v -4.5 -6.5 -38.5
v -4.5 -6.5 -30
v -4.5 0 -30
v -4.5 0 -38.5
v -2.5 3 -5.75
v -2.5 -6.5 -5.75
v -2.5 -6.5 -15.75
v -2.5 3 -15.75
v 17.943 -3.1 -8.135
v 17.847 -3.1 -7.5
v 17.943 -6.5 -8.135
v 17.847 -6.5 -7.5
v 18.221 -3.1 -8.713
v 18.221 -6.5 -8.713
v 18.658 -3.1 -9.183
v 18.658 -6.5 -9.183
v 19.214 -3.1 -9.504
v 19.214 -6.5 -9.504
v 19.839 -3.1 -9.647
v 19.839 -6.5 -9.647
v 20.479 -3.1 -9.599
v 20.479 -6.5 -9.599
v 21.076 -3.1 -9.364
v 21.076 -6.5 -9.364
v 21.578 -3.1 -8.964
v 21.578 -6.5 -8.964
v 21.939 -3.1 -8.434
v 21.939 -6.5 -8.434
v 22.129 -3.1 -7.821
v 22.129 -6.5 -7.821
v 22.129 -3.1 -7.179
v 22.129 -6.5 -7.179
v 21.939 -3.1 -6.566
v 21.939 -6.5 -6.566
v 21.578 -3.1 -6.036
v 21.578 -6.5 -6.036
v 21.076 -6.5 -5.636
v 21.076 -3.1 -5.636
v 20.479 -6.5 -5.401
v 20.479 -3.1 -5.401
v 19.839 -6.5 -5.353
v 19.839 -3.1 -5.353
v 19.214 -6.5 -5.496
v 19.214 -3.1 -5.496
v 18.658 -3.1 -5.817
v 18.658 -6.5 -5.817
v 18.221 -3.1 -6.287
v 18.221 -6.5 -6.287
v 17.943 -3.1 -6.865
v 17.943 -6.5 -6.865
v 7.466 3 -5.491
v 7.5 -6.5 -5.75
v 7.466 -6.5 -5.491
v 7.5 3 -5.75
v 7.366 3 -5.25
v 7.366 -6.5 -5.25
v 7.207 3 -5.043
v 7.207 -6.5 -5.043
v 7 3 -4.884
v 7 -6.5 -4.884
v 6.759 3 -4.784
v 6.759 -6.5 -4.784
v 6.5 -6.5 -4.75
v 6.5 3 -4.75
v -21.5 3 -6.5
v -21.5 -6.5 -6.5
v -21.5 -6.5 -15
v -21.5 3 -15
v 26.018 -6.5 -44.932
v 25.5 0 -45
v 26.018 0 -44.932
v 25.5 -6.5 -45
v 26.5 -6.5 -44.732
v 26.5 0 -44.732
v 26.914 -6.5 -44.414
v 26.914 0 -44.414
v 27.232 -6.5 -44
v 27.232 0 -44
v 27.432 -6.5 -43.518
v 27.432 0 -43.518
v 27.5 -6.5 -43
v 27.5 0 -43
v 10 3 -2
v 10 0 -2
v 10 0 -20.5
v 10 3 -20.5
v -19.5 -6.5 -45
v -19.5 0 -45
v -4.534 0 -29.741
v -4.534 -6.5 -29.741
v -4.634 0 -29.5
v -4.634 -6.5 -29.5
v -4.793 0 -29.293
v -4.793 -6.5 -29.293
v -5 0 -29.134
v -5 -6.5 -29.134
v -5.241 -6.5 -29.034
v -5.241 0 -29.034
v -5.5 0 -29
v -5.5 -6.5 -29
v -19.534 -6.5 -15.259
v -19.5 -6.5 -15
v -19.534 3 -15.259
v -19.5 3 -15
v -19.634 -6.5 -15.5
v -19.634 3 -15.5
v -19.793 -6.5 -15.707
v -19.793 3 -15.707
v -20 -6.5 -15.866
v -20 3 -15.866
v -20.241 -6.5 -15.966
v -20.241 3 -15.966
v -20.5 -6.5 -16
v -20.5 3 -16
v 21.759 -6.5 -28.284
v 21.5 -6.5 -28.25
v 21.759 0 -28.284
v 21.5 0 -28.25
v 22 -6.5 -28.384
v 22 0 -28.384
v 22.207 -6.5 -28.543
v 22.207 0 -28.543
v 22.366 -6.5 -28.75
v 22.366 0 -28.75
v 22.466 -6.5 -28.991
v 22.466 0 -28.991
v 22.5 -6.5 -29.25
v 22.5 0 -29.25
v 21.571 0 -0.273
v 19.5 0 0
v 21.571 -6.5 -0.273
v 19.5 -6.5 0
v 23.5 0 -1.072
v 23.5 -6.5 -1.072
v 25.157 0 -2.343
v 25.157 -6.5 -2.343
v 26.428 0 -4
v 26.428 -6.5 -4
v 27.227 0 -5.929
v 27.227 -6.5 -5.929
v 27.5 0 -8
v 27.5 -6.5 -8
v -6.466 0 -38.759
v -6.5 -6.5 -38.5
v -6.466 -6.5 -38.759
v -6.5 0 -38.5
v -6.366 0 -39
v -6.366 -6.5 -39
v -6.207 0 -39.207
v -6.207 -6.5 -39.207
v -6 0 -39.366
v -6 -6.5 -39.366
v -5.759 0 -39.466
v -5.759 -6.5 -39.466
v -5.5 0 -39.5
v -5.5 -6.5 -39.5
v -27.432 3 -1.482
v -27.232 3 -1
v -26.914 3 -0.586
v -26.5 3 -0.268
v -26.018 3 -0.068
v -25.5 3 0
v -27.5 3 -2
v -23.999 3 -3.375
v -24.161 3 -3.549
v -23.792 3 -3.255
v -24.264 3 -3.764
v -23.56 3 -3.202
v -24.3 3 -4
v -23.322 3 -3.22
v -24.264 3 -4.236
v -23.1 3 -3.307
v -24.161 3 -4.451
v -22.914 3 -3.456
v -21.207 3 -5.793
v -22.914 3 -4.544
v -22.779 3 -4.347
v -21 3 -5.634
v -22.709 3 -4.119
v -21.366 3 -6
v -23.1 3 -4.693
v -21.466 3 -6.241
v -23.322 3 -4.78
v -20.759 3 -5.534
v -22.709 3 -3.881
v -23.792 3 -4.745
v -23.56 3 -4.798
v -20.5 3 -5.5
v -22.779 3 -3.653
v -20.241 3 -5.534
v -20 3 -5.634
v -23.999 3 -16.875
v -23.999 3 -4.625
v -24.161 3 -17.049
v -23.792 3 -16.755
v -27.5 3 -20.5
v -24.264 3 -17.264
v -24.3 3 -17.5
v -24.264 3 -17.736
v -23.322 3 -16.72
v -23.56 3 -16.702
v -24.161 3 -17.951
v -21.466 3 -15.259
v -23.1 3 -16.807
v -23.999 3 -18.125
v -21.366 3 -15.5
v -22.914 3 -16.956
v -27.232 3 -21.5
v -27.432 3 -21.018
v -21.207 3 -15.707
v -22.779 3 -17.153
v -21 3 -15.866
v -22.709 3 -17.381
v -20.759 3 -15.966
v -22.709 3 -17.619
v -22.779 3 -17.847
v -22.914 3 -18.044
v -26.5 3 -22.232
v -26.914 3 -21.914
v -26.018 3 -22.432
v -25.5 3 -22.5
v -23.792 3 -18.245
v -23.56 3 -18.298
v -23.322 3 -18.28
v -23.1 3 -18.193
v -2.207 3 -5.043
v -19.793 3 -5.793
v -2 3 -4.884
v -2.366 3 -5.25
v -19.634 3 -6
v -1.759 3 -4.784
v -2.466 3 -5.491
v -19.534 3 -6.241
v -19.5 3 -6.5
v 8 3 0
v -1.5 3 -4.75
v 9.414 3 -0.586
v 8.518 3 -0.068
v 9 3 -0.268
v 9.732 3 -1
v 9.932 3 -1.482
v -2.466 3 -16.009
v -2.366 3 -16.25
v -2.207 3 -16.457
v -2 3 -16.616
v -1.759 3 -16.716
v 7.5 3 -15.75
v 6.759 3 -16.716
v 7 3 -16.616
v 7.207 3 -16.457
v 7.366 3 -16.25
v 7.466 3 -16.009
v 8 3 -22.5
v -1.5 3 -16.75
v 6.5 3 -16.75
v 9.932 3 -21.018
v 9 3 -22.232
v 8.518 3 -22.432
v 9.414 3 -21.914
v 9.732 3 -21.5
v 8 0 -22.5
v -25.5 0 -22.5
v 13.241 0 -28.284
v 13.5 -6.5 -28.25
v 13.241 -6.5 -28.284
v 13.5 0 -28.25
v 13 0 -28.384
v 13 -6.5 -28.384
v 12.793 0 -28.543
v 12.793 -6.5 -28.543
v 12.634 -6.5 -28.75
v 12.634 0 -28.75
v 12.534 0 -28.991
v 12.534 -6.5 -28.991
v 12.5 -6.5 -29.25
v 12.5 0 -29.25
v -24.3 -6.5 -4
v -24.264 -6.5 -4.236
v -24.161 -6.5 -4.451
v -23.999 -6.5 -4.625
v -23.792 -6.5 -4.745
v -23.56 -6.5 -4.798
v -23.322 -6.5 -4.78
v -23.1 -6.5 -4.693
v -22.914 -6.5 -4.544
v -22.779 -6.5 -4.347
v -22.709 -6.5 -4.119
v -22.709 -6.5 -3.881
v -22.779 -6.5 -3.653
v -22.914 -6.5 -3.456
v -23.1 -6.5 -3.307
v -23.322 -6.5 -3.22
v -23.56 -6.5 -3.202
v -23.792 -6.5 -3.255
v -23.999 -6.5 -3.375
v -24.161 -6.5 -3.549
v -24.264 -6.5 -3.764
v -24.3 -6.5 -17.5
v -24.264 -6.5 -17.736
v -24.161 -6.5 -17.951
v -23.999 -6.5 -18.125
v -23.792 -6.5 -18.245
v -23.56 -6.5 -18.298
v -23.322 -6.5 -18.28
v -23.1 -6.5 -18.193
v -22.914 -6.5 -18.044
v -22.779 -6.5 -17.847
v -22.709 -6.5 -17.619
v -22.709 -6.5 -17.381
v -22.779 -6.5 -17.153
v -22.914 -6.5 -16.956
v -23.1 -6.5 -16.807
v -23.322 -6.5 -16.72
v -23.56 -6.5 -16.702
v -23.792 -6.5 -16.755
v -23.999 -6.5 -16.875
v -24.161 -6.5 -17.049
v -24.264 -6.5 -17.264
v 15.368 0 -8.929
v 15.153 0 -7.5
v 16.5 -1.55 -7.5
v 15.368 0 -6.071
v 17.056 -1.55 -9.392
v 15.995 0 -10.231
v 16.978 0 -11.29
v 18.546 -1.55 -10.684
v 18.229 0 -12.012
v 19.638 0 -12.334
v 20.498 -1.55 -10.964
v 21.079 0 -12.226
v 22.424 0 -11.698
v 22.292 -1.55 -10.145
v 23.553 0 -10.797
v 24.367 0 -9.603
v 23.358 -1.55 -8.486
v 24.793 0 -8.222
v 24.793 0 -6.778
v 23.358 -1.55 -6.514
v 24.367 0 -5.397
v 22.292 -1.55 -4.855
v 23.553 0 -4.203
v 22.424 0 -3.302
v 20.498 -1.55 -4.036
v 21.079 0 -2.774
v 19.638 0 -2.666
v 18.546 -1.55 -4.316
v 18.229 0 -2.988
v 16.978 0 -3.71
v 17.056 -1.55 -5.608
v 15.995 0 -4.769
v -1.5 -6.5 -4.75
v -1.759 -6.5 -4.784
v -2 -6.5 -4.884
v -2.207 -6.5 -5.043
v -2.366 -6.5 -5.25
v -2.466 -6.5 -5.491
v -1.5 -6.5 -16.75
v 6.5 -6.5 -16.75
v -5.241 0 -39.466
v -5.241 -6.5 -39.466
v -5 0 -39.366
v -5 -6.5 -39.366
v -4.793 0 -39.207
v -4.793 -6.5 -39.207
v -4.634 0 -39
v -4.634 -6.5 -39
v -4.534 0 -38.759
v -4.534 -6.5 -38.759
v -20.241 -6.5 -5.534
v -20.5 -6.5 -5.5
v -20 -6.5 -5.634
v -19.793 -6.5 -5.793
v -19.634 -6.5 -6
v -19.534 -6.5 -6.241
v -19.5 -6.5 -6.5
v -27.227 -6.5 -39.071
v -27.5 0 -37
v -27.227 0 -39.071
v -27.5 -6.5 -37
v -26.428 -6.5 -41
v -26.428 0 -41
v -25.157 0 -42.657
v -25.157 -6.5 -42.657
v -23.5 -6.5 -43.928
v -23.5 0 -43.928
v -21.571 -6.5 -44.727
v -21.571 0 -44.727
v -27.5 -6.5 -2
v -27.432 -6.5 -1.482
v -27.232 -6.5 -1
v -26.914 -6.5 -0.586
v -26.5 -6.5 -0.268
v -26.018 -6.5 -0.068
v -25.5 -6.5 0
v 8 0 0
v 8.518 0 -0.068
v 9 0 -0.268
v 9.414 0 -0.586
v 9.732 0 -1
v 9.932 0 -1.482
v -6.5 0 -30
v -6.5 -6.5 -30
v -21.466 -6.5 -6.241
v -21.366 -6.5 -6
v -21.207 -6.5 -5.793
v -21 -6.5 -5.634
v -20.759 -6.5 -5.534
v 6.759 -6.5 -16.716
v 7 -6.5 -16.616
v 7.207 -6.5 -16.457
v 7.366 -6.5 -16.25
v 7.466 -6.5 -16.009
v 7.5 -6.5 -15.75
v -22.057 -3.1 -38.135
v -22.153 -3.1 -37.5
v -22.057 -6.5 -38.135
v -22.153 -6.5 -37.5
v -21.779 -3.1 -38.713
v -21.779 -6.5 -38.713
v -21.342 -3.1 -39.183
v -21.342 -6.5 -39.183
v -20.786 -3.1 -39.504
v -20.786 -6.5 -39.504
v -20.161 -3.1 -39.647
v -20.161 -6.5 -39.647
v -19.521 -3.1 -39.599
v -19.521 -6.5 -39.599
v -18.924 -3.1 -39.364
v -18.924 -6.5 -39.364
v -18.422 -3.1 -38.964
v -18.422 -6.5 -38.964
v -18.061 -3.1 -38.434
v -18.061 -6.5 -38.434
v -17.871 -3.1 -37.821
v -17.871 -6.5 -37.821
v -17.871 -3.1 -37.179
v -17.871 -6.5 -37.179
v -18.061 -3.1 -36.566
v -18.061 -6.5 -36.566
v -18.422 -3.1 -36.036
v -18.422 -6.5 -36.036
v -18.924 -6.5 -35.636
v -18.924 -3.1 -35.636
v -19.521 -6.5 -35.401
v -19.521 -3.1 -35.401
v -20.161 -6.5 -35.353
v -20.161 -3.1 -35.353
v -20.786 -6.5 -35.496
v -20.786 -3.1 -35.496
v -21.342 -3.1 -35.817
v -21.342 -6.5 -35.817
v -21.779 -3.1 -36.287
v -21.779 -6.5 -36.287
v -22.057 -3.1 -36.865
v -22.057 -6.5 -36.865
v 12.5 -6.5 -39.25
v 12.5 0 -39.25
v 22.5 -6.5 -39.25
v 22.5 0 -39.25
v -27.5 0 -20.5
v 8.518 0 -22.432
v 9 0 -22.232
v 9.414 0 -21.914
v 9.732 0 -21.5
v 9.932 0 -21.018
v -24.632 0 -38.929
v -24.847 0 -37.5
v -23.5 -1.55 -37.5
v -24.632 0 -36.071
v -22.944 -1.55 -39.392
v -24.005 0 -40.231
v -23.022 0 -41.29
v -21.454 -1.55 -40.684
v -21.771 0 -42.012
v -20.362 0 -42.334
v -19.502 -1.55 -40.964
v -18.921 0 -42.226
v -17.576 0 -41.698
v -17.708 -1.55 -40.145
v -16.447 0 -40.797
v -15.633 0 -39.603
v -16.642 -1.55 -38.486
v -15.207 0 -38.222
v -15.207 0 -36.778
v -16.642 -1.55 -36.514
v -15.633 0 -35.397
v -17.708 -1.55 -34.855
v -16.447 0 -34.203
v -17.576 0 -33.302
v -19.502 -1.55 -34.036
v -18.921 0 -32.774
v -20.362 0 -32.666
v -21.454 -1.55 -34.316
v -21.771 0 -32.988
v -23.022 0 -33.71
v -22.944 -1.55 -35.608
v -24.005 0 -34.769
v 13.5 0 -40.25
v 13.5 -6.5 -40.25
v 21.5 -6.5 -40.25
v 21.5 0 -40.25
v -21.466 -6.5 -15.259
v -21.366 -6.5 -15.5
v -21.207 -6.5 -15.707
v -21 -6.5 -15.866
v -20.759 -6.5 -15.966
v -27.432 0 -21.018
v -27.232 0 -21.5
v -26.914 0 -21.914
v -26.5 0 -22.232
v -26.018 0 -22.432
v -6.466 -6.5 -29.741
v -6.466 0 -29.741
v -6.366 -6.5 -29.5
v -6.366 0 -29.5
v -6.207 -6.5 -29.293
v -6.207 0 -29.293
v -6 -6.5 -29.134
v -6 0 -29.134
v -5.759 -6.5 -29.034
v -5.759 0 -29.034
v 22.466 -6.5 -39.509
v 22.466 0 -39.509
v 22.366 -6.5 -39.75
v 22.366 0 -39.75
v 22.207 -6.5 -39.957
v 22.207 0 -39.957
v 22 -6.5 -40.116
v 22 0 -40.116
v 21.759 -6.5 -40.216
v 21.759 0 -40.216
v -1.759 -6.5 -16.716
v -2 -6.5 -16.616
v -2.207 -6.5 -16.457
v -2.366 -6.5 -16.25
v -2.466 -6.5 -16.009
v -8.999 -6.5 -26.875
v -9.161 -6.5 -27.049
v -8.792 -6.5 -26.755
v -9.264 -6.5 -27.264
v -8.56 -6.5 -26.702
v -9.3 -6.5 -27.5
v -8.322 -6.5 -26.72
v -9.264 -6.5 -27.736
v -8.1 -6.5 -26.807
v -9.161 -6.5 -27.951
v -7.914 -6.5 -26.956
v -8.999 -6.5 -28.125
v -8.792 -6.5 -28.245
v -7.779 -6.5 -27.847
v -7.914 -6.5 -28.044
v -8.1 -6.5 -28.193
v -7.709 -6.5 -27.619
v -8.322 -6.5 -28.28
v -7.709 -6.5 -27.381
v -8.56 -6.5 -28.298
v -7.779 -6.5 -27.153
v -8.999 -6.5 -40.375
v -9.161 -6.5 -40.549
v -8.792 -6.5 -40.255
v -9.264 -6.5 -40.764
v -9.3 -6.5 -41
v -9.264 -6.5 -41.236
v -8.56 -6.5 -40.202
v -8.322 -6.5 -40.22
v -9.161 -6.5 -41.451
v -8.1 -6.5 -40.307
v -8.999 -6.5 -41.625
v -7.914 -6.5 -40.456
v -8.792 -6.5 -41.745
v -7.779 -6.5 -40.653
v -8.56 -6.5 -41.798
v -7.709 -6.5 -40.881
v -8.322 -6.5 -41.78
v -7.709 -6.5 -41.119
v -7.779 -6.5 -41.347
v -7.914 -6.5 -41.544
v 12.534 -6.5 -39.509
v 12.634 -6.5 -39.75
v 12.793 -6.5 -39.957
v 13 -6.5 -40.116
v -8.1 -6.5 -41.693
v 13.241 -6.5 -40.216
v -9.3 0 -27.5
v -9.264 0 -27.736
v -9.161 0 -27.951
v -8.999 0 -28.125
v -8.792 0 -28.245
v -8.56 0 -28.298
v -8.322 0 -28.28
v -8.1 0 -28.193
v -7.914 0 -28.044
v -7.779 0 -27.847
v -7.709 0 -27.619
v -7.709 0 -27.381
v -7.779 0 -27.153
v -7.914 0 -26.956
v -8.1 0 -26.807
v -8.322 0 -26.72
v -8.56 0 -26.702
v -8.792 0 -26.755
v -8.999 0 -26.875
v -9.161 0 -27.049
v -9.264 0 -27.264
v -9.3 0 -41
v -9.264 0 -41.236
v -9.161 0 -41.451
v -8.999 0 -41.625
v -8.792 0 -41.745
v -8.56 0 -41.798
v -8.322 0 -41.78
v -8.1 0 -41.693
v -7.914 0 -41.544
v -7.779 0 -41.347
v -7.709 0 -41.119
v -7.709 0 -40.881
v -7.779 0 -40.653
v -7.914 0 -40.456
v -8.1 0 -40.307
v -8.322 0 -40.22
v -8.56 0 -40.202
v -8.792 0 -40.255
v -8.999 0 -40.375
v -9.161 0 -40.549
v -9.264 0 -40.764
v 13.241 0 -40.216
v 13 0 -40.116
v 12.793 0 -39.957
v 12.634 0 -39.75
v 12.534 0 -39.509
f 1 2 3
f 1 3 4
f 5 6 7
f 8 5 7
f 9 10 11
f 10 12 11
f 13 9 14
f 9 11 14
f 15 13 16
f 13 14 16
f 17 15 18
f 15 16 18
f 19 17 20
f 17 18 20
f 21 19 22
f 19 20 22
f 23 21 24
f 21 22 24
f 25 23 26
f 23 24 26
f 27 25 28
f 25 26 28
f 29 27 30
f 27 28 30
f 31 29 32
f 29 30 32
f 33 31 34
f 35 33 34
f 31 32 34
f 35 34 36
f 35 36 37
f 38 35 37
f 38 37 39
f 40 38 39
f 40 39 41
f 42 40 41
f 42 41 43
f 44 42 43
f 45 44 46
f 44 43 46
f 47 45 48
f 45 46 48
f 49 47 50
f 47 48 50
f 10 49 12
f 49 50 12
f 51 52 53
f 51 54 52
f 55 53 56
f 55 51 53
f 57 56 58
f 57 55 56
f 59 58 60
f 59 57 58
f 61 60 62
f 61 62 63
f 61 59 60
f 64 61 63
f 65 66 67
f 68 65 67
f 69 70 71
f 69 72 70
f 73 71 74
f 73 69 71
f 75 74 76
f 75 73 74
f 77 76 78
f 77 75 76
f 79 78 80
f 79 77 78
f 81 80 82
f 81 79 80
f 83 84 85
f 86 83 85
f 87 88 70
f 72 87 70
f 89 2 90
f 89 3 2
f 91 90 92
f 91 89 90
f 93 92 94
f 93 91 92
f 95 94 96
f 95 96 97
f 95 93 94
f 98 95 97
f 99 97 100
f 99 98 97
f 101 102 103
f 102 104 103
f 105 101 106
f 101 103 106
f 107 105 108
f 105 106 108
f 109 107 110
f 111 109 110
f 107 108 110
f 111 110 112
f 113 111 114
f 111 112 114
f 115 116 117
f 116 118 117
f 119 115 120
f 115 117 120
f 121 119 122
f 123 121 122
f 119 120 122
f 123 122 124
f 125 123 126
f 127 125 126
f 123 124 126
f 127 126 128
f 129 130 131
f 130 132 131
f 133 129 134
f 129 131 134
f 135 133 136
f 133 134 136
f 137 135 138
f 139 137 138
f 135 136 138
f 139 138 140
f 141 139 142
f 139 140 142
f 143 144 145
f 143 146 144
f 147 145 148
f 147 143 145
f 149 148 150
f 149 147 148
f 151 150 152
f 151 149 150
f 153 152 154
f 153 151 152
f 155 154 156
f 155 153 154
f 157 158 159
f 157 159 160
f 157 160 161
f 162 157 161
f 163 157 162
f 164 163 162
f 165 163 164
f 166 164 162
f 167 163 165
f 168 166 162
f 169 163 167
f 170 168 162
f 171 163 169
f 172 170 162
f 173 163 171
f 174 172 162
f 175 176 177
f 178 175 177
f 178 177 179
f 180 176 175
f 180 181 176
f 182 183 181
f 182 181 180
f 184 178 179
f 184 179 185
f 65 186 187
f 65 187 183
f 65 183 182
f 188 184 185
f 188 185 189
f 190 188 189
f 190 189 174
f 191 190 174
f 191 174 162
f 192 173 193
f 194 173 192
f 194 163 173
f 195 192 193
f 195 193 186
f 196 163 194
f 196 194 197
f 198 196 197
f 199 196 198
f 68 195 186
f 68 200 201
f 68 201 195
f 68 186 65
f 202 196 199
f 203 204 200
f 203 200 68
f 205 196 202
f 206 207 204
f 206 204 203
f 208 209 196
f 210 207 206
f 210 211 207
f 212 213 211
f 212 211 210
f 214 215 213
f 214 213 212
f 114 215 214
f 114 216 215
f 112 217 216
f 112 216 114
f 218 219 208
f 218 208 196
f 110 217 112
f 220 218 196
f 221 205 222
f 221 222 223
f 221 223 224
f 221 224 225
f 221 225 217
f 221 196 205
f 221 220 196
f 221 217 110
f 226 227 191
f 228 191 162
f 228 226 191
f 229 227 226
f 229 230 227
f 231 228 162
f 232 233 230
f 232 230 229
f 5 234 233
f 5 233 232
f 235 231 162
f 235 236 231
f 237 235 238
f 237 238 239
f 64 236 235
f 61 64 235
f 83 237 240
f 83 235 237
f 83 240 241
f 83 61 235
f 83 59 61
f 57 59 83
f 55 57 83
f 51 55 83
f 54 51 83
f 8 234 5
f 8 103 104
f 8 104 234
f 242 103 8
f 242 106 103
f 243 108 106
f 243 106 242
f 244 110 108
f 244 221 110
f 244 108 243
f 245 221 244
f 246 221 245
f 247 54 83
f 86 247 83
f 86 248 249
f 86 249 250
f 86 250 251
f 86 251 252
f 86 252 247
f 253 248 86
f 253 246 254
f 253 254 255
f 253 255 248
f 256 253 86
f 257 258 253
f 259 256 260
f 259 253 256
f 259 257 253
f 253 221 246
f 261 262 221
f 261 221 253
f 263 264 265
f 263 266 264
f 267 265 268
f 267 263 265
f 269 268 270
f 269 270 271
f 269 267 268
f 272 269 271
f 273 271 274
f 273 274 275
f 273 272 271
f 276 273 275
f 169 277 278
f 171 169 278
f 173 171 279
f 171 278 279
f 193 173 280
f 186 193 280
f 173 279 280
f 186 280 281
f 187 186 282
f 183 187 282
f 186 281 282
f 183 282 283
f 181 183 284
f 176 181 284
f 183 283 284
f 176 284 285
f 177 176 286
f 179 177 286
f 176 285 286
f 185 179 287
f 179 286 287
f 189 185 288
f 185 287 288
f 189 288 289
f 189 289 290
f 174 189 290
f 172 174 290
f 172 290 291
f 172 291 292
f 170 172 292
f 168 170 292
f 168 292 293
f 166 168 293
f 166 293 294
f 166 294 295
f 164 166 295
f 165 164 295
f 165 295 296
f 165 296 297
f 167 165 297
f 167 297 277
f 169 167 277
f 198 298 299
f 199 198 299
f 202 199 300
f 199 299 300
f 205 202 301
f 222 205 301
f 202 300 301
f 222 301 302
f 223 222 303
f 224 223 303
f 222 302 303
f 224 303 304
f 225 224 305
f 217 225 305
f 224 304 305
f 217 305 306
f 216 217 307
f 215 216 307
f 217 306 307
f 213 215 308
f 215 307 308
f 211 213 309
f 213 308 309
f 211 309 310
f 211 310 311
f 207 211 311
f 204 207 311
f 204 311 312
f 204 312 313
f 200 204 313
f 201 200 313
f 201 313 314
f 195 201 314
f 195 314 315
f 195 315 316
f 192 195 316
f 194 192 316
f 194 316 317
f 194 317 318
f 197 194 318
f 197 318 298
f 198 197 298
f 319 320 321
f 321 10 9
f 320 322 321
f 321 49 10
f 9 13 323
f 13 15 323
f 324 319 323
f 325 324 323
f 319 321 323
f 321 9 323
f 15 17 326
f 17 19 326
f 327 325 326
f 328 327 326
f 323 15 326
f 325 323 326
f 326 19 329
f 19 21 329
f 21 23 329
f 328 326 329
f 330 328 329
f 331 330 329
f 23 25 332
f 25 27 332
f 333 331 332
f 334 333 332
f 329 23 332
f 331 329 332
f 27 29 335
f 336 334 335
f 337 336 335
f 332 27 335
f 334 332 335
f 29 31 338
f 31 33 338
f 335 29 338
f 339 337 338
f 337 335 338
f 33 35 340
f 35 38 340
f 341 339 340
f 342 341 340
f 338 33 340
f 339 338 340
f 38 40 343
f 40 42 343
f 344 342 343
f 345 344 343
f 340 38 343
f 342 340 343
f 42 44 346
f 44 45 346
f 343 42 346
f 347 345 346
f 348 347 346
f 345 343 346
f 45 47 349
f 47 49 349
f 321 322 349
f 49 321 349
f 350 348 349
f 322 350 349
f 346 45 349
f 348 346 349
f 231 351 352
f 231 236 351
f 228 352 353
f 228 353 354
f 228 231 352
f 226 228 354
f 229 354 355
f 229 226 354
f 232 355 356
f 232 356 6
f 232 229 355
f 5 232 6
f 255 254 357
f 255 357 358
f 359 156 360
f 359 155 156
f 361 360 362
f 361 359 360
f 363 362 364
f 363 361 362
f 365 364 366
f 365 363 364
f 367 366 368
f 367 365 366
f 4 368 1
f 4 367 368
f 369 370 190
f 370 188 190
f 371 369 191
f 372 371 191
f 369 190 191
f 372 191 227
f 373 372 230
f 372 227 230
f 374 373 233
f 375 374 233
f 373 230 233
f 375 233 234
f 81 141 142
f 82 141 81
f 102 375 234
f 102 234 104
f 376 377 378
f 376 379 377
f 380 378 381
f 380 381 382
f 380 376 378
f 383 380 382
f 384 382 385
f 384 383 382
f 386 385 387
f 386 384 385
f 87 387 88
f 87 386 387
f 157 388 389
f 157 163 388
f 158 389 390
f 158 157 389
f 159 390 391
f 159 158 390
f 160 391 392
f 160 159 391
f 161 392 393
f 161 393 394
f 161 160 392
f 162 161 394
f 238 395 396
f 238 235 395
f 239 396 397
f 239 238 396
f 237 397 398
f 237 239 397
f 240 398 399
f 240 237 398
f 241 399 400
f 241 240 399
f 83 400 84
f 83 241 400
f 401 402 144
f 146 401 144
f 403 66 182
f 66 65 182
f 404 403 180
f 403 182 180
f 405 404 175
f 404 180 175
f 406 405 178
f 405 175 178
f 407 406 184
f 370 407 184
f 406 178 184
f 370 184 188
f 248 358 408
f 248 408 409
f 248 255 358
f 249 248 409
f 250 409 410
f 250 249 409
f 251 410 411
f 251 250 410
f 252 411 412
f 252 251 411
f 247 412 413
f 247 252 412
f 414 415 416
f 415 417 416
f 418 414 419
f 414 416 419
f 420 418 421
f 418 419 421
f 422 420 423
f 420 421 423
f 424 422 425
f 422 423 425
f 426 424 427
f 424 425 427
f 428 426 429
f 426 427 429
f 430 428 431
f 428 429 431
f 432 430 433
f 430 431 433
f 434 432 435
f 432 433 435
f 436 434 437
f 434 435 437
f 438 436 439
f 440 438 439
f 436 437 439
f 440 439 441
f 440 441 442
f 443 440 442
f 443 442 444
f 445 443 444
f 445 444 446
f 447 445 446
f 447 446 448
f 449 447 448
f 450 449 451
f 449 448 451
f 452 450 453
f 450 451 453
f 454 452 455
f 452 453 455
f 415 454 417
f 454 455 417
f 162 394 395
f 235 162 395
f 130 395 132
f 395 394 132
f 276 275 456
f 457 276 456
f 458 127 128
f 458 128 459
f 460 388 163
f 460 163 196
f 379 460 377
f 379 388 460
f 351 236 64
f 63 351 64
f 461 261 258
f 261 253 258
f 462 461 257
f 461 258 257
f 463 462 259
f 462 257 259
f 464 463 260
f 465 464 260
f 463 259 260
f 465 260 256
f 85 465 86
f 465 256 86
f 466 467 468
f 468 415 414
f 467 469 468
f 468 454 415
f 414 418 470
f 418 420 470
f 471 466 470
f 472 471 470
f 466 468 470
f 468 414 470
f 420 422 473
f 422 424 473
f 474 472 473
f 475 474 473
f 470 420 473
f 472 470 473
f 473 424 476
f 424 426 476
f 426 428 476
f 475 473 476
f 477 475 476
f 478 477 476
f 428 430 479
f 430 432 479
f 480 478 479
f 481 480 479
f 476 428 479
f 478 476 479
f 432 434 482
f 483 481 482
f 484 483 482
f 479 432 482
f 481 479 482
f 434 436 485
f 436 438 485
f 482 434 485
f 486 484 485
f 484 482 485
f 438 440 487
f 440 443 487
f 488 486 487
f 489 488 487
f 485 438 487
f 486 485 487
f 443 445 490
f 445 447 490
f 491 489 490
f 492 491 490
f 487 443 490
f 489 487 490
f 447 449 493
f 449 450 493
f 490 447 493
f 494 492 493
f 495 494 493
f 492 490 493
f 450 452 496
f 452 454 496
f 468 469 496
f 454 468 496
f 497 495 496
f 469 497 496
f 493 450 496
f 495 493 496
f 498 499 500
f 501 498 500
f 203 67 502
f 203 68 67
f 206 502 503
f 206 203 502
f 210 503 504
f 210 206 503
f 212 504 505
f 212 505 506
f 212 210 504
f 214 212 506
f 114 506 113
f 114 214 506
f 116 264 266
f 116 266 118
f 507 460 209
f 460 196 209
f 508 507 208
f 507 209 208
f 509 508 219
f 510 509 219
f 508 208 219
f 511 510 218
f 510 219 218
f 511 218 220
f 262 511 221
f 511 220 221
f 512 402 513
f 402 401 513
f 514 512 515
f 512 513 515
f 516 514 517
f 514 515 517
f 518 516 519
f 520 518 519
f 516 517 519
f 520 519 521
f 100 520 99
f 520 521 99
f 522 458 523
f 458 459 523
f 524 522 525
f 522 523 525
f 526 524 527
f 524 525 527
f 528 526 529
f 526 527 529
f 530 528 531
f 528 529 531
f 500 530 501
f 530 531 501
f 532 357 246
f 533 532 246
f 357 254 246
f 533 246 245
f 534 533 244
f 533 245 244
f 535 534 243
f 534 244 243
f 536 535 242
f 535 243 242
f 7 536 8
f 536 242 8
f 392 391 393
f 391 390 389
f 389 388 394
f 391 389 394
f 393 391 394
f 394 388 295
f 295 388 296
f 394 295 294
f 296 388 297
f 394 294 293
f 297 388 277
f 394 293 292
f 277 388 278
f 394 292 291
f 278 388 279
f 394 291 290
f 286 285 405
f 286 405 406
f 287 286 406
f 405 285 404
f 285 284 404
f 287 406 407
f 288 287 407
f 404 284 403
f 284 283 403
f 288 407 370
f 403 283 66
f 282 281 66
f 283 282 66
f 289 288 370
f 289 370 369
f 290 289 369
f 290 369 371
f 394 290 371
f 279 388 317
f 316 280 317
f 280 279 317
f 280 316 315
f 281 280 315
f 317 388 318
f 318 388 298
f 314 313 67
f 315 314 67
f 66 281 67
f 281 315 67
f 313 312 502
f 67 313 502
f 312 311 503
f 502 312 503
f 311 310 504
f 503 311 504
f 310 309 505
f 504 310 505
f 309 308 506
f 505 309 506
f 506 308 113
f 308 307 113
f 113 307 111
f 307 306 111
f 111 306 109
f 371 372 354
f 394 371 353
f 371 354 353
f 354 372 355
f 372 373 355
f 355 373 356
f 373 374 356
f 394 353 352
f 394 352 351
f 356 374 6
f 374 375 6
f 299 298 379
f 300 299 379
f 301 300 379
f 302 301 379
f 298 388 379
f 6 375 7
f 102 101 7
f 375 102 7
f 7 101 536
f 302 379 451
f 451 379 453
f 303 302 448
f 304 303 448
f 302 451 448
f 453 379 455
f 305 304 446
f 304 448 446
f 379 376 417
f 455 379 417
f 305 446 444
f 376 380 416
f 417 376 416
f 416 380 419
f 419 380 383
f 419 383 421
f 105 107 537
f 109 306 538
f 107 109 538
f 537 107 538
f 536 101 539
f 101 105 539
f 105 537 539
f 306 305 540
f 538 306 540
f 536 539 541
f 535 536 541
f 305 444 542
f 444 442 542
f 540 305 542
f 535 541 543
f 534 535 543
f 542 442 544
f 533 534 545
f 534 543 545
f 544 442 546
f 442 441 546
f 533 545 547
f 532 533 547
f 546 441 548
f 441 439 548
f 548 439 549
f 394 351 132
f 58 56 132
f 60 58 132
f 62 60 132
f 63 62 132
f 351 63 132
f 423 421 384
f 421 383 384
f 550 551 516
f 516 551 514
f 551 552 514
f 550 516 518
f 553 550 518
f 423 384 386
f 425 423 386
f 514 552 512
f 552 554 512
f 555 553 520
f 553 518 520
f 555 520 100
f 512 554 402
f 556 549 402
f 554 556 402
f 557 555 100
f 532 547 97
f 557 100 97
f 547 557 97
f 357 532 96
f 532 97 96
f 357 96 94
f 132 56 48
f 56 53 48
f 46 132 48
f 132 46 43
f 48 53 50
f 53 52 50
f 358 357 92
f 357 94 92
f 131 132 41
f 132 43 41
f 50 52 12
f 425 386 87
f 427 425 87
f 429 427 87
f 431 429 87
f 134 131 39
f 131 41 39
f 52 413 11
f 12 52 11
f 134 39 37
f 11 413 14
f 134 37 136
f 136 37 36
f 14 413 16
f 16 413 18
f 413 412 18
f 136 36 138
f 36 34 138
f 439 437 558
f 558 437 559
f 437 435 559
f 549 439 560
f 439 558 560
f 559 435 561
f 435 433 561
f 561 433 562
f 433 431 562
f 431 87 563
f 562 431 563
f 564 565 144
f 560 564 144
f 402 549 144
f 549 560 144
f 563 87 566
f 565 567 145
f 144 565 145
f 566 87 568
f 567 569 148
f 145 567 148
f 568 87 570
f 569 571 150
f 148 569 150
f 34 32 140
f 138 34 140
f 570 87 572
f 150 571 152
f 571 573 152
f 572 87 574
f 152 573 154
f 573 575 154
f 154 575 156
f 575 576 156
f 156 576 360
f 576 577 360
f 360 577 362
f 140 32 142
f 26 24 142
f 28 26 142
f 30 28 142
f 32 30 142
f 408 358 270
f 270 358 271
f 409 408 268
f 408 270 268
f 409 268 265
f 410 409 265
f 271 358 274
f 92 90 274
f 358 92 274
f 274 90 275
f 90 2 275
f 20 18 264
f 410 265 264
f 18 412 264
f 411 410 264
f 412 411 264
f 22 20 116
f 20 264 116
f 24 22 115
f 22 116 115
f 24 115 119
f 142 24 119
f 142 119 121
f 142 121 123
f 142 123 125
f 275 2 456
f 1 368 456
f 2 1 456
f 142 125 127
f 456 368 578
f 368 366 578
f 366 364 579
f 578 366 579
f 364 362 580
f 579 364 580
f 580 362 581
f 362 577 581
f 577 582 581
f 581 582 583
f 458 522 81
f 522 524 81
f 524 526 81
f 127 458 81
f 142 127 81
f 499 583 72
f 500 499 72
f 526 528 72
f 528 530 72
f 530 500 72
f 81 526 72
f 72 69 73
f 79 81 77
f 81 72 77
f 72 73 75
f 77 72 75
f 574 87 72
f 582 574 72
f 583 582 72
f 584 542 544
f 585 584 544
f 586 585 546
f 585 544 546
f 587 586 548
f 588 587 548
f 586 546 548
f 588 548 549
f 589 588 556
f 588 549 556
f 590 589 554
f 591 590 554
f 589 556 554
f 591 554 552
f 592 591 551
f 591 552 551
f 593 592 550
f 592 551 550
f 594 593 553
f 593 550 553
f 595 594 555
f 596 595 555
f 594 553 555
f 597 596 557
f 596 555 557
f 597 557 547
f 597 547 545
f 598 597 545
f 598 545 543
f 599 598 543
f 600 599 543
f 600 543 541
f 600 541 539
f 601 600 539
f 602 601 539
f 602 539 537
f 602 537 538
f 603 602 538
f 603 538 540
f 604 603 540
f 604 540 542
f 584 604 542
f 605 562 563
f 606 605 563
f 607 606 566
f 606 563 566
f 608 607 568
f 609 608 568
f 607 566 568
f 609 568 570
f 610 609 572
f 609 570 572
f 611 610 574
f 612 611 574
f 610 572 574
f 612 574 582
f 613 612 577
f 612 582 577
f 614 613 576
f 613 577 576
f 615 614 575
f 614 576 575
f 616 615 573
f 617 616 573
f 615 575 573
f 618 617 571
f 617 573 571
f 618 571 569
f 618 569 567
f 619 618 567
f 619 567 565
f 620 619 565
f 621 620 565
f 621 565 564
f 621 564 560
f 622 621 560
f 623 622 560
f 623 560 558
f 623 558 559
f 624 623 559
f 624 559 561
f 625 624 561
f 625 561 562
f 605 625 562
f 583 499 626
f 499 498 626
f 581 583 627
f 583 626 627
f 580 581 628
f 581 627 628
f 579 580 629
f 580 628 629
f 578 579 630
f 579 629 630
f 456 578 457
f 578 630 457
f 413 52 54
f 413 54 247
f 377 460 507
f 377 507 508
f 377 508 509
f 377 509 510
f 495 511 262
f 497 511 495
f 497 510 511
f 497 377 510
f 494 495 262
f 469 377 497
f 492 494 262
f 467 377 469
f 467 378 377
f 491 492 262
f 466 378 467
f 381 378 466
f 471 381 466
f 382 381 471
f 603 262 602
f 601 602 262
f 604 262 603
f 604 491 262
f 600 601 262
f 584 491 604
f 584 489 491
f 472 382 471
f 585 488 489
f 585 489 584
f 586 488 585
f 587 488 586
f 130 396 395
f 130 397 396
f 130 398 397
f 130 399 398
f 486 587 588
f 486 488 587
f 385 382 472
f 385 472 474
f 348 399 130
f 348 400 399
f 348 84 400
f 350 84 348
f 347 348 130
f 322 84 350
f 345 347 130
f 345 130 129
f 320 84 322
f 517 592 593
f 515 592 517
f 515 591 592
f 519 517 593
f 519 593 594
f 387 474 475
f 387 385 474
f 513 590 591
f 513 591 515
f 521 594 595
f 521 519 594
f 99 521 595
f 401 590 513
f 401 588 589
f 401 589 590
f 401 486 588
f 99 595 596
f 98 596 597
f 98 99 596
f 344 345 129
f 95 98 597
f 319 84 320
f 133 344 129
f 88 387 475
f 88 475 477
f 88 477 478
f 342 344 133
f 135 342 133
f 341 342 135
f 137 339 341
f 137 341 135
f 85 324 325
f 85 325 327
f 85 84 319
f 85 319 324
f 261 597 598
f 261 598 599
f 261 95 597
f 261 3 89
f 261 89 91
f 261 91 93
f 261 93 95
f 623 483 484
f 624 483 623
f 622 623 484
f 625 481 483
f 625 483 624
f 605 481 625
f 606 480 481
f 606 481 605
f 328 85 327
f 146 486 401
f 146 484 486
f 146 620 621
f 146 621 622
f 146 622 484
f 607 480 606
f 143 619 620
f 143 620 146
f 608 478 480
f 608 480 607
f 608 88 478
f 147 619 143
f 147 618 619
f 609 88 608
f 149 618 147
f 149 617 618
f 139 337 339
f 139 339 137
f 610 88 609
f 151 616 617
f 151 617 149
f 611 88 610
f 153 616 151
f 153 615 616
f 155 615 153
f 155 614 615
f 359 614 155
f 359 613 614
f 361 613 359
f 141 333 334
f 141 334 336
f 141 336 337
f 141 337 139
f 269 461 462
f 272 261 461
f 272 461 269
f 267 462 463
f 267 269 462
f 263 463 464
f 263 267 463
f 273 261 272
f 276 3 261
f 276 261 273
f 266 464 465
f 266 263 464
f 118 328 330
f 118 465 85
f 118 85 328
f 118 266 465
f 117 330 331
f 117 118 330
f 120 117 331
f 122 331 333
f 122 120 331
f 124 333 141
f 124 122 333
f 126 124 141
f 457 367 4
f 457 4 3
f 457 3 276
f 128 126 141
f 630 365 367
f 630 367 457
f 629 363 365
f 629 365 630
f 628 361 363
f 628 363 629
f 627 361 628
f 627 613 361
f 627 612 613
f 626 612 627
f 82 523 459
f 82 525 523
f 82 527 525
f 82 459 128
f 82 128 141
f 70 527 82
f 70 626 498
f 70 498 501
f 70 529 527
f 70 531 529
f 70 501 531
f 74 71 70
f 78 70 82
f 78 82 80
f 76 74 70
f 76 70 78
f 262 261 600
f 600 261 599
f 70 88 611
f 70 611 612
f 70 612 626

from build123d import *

# Parameters (mm, degrees)
BASE_SKETCH_W                       = 55
BASE_SKETCH_H                       = 45
BASE_EXTRUDE_DEPTH                  = 6.5
RAISED_SECTION_SKETCH_W             = 37.5
RAISED_SECTION_SKETCH_H             = 22.5
RAISED_SECTION_EXTRUDE_DEPTH        = 3
MOSFET_MOUNTING_HOLES_D             = 1.6
MOUNTING_HOLES_D                    = 4.3053
MOUNTING_HOLES_CSINK_D              = 9.6944688
MOUNTING_HOLES_CSINK_ANGLE          = 82
CUT_PIN_RELIEF_DEPTH                = 54.136616377
CUT_PIN_RELIEF_DEPTH_BACK           = 54.136616377
PIN_SKETCH_W                        = 10
PIN_SKETCH_H                        = 12
PIN_SKETCH_W_2                      = 2
PIN_SKETCH_H_2                      = 10.5
LARGE_OUTSIDE_CORNER_FILLETS_R      = 8
SMALL_OUTSIDE_CORNER_FILLETS_R      = 2
SCREW_TERMINAL_CUTOUT_FILLETS_R     = 1
HEADER_PINS_CUTOUT_RELIEF_FILLETS_R = 1


with BuildPart() as part:
    # Base Sketch → Base Extrude (new body)
    with BuildSketch(Plane(origin=(0, 0, 0), x_dir=(1, 0, 0), z_dir=(0, 1, 0))):
        with Locations((0, 22.5)):
            Rectangle(BASE_SKETCH_W, BASE_SKETCH_H)
    extrude(amount=-BASE_EXTRUDE_DEPTH)

    # Raised Section Sketch → Raised Section Extrude (add)
    with BuildSketch(Plane(origin=(0, 0, 0), x_dir=(1, 0, 0), z_dir=(0, 1, 0))):
        with Locations((-8.75, 11.25)):
            Rectangle(RAISED_SECTION_SKETCH_W, RAISED_SECTION_SKETCH_H)
    extrude(amount=RAISED_SECTION_EXTRUDE_DEPTH)

    # Mosfet Mounting Holes (through all)
    with Locations(Plane(origin=(0, 3, 0), x_dir=(1, 0, 0), z_dir=(0, 1, 0))):
        with Locations((-23.5, 4), (-23.5, 17.5), (-8.5, 27.5), (-8.5, 41)):
            Hole(MOSFET_MOUNTING_HOLES_D / 2)

    # Mounting Holes (through all)
    with Locations(Plane(origin=(0, 0, 0), x_dir=(1, 0, 0), z_dir=(0, 1, 0))):
        with Locations((-20, 37.5), (20, 7.5)):
            CounterSinkHole(MOUNTING_HOLES_D / 2, MOUNTING_HOLES_CSINK_D / 2, counter_sink_angle=MOUNTING_HOLES_CSINK_ANGLE)

    # Pin Sketch → Cut Pin Relief (cut, two sides: drawn at the far end of the back side and taken through both)
    with BuildSketch(Plane(origin=(0, 0, 0), x_dir=(1, 0, 0), z_dir=(0, 1, 0)).offset(-CUT_PIN_RELIEF_DEPTH_BACK)):
        with Locations((2.5, 10.75)):
            Rectangle(PIN_SKETCH_W, PIN_SKETCH_H)
        with Locations((17.5, 34.25)):
            Rectangle(PIN_SKETCH_W, PIN_SKETCH_H)
        with Locations((-20.5, 10.75)):
            Rectangle(PIN_SKETCH_W_2, PIN_SKETCH_H_2)
        with Locations((-5.5, 34.25)):
            Rectangle(PIN_SKETCH_W_2, PIN_SKETCH_H_2)
    extrude(amount=CUT_PIN_RELIEF_DEPTH + CUT_PIN_RELIEF_DEPTH_BACK, mode=Mode.SUBTRACT)

    # Large Outside Corner Fillets
    large_outside_corner_fillets_edges = [part.edges().sort_by_distance(p)[0] for p in [
        (-27.5, -3.25, -45),
        (27.5, -3.25, 0),
    ]]
    fillet(large_outside_corner_fillets_edges, radius=LARGE_OUTSIDE_CORNER_FILLETS_R)

    # Small Outside Corner Fillets
    small_outside_corner_fillets_edges = [part.edges().sort_by_distance(p)[0] for p in [
        (-27.5, 1.5, -22.5),
        (10, 1.5, 0),
        (10, 1.5, -22.5),
        (27.5, -3.25, -45),
        (-27.5, -1.75, 0),
    ]]
    fillet(small_outside_corner_fillets_edges, radius=SMALL_OUTSIDE_CORNER_FILLETS_R)

    # Screw Terminal Cutout Fillets
    screw_terminal_cutout_fillets_edges = [part.edges().sort_by_distance(p)[0] for p in [
        (-2.5, -1.75, -4.75),
        (-2.5, -1.75, -16.75),
        (7.5, -1.75, -16.75),
        (7.5, -1.75, -4.75),
        (12.5, -3.25, -28.25),
        (12.5, -3.25, -40.25),
        (22.5, -3.25, -40.25),
        (22.5, -3.25, -28.25),
    ]]
    fillet(screw_terminal_cutout_fillets_edges, radius=SCREW_TERMINAL_CUTOUT_FILLETS_R)

    # Header Pins Cutout Relief Fillets
    header_pins_cutout_relief_fillets_edges = [part.edges().sort_by_distance(p)[0] for p in [
        (-4.5, -3.25, -29),
        (-6.5, -3.25, -29),
        (-6.5, -3.25, -39.5),
        (-4.5, -3.25, -39.5),
        (-19.5, -1.75, -16),
        (-21.5, -1.75, -16),
        (-21.5, -1.75, -5.5),
        (-19.5, -1.75, -5.5),
    ]]
    fillet(header_pins_cutout_relief_fillets_edges, radius=HEADER_PINS_CUTOUT_RELIEF_FILLETS_R - 0.0001)  # a hair under: the kernel refuses the full size


solid = part.part
